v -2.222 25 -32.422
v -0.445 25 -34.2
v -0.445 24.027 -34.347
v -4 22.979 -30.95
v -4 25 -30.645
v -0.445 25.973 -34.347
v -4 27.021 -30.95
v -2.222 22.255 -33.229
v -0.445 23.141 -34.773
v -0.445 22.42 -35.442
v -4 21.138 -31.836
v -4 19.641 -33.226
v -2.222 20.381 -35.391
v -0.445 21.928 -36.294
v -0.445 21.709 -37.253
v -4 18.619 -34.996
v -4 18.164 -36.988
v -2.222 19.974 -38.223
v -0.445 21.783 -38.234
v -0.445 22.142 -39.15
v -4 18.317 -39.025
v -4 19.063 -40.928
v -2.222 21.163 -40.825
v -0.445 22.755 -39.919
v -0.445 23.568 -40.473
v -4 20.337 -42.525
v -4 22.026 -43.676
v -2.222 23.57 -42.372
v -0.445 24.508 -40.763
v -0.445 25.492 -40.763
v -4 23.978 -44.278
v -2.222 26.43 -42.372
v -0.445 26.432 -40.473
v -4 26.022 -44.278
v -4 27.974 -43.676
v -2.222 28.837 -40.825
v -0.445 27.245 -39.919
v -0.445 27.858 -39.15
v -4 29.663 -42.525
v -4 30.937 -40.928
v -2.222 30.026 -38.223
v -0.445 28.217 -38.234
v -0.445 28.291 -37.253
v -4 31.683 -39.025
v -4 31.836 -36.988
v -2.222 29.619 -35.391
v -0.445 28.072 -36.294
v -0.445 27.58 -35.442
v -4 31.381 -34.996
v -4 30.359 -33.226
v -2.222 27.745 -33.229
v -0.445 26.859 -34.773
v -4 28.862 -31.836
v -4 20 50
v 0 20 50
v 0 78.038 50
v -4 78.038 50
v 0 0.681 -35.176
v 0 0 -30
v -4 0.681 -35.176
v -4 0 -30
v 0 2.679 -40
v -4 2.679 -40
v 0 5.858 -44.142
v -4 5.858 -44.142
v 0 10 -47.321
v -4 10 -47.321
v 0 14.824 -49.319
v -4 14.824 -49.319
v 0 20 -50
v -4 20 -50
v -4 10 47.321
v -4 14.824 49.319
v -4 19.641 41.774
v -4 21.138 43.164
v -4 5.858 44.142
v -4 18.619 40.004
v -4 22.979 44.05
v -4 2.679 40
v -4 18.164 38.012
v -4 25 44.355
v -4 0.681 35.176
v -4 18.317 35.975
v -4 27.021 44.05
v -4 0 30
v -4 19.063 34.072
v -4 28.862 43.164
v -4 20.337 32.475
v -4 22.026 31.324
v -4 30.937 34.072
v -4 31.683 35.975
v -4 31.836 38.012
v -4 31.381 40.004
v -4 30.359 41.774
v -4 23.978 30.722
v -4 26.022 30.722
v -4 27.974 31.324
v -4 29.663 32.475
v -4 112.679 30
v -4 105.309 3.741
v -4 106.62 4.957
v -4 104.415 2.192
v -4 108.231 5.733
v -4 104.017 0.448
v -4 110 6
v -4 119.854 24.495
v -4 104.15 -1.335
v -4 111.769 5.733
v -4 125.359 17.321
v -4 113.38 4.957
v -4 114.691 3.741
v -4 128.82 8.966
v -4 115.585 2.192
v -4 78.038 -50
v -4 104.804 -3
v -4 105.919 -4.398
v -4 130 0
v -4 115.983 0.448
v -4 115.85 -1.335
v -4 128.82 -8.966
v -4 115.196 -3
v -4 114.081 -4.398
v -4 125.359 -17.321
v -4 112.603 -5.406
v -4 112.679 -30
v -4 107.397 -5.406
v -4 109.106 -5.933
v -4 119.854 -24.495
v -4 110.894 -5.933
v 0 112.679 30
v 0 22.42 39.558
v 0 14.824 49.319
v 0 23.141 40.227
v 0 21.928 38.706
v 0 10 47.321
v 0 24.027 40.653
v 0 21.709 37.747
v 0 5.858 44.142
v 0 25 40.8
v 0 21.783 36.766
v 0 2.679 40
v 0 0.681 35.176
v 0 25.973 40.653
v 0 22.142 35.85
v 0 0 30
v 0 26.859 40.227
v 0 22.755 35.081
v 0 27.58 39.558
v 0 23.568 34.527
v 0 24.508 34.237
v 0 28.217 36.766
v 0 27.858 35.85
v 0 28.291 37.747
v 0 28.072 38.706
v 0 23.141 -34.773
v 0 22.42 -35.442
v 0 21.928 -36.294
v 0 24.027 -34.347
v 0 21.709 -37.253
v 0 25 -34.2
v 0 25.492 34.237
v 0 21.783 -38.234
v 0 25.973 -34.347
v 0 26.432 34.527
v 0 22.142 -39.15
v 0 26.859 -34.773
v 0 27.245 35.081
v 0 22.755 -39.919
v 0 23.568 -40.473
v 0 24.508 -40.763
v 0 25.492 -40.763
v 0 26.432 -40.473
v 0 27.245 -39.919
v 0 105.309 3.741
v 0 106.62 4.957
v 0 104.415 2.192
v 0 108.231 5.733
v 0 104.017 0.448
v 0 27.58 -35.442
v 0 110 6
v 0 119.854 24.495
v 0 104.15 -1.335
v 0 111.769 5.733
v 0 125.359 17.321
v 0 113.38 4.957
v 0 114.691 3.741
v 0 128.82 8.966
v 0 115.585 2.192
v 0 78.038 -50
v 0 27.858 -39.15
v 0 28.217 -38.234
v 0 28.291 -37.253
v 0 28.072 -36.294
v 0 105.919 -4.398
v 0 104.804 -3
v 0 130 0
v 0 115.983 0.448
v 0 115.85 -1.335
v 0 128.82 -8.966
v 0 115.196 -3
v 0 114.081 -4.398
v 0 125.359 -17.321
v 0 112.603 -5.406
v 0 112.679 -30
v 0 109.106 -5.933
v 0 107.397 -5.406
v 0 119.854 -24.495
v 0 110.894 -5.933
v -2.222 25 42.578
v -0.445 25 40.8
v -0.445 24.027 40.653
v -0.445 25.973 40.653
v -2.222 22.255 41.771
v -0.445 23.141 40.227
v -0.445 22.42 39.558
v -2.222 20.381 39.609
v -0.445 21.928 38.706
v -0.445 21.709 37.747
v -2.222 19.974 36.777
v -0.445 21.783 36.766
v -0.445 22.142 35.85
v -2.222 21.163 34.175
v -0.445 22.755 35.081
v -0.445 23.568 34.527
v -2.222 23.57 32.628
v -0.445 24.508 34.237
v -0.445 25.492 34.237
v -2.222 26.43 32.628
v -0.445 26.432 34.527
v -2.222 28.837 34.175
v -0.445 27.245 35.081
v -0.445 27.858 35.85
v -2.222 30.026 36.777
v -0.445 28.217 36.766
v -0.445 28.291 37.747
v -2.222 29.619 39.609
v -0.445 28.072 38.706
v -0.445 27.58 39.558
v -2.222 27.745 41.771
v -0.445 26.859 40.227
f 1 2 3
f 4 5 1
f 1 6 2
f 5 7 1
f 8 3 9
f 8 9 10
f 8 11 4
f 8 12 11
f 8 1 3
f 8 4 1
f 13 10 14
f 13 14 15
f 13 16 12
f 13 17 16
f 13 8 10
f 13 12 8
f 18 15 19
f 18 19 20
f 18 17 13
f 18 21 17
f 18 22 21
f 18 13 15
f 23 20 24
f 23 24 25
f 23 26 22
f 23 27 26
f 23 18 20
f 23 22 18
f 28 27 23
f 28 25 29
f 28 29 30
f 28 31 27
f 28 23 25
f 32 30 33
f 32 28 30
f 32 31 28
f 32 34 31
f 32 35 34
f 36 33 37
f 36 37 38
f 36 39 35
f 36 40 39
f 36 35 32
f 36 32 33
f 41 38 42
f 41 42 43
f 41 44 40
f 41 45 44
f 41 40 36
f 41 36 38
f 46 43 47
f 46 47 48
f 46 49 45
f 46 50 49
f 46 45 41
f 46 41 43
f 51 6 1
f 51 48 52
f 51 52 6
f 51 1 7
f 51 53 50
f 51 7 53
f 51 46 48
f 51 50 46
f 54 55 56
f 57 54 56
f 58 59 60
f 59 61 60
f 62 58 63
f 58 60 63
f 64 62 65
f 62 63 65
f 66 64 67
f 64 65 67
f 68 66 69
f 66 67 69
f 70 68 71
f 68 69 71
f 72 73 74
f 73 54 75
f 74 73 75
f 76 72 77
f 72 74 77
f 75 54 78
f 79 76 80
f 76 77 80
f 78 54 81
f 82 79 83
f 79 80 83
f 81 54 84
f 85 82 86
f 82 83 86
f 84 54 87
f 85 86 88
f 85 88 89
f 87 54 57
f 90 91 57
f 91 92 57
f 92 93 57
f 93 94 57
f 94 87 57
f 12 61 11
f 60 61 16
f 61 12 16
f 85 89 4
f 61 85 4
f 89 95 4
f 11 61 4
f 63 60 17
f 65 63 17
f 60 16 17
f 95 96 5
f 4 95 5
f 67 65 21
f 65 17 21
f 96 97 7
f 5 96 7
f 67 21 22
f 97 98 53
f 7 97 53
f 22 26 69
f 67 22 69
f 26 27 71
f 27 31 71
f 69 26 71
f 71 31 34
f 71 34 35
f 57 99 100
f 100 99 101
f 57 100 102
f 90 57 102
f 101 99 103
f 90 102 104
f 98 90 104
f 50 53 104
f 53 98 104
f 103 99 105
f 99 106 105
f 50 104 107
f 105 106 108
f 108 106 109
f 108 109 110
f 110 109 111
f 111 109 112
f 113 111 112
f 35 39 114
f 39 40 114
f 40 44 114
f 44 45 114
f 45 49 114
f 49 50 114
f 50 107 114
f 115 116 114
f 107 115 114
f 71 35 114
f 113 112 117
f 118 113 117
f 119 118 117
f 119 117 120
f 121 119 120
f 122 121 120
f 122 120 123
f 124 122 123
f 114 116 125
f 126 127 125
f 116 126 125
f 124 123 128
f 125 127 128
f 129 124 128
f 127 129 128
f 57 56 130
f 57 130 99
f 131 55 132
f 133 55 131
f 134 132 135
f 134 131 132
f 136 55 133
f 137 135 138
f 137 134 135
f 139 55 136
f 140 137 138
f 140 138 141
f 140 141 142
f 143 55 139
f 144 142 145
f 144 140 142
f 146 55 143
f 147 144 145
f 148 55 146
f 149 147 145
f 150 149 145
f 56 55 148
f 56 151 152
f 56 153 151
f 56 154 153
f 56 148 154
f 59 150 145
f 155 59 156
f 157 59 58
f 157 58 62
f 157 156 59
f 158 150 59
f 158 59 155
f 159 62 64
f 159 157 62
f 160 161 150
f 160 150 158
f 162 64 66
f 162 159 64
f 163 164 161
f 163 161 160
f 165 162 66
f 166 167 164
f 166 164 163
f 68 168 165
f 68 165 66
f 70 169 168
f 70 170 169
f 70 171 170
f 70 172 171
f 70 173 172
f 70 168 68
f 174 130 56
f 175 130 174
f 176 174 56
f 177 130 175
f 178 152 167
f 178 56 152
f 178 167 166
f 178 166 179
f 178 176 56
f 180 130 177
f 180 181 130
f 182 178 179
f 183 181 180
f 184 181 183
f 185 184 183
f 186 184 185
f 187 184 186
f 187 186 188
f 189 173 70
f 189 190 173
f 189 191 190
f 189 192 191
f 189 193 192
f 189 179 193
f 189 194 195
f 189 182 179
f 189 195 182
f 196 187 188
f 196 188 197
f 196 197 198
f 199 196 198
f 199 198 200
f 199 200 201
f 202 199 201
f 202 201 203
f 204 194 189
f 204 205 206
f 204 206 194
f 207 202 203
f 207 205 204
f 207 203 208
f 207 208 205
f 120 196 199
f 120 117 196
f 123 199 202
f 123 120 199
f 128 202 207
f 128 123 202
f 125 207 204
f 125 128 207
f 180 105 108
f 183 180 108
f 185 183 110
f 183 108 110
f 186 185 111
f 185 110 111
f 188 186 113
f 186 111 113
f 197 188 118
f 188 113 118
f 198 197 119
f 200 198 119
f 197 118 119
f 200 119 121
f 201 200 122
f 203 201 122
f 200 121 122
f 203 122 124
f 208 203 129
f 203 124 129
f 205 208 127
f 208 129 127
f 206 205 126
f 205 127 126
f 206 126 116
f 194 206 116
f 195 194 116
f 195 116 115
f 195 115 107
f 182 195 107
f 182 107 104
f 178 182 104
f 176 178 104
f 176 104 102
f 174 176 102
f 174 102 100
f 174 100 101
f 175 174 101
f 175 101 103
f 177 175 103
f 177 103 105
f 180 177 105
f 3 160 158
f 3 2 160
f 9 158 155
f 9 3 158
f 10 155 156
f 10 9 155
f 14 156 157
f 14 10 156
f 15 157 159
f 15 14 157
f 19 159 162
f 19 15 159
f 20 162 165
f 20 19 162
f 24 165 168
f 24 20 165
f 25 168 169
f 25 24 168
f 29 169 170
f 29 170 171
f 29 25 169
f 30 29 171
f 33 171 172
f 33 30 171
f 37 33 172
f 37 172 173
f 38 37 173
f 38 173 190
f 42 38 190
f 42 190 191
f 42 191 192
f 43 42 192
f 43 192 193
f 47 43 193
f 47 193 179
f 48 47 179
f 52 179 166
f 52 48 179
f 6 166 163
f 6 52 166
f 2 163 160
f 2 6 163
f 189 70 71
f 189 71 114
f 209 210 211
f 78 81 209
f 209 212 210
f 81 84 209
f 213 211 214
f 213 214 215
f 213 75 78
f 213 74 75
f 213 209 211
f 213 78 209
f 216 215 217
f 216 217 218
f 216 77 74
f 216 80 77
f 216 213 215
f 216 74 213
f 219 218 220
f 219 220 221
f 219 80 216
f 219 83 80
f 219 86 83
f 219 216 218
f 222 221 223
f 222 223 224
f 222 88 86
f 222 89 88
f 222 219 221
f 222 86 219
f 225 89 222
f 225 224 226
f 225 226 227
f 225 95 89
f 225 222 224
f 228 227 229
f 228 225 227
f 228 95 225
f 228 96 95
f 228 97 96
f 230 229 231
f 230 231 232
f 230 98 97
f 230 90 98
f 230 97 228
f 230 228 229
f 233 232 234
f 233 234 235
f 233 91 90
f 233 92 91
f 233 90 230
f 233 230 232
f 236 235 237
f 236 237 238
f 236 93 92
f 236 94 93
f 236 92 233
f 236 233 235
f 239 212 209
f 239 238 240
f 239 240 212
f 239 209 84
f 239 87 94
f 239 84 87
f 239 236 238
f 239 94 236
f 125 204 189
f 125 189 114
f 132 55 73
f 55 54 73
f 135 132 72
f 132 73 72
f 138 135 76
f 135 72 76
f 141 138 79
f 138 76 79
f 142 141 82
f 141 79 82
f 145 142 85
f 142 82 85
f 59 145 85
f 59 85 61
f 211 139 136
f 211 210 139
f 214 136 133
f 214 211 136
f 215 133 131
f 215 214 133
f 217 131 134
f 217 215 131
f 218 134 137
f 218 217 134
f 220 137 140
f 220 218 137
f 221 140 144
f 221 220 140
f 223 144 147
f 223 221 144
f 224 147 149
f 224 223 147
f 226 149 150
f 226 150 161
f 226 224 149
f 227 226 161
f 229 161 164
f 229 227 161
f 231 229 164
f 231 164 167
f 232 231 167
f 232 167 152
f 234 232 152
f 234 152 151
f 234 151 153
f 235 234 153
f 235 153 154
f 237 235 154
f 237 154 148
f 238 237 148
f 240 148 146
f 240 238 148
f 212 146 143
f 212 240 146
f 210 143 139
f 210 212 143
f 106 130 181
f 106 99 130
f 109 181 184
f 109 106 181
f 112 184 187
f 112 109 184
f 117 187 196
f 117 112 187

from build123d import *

# Parameters (mm, degrees)
SKETCH_10_W                = 100
SKETCH_10_H                = 130
SM_BASE_FLANGE_1_DEPTH     = 4
SKETCH_13_R                = 6
CUT_EXTRUDE_1_DEPTH        = 10
HOLE_WIZARD_M61_AT_2_COUNT = 2
HOLE_WIZARD_M61_AT_2_PITCH = 75
CHAMFER_1_SIZE             = 30
CHAMFER_1_SIZE2            = 51.961524227
FILLET_1_R                 = 34.641016
FILLET_2_R                 = 20


# Sheet-metal steps are written as plain solids
with BuildPart() as part:
    # Эскиз10 → Базовая кромка1 (new body)
    with BuildSketch(Plane(origin=(0, 0, 0), x_dir=(0, 0, -1), z_dir=(1, 0, 0))):
        with Locations((0, 65)):
            Rectangle(SKETCH_10_W, SKETCH_10_H)
    extrude(amount=-SM_BASE_FLANGE_1_DEPTH)

    # Эскиз13 → Вырез-Вытянуть1 (cut)
    with BuildSketch(Plane.ZY.offset(4)):
        with Locations((0, 110)):
            Circle(SKETCH_13_R)
    extrude(amount=-CUT_EXTRUDE_1_DEPTH, mode=Mode.SUBTRACT)

    # Эскиз16 → Зенковка для винта с потайной головкой и внутренним шестигранником M61 (revolve, cut)
    with BuildSketch(Plane(origin=(-4, 25, -37.5), x_dir=(0, 0, 1), z_dir=(0, 1, 0))):
        Polygon((0, 0), (0, 4), (3.3, 4), (3.3, 3.555), (6.855, 0), align=None)
    hole_wizard_m61 = revolve(axis=Axis((-10.35, 25, -37.5), (1, 0, 0)), mode=Mode.SUBTRACT)

    # Зенковка для винта с потайной головкой и внутренним шестигранником M61 at 2: Зенковка для винта с потайной головкой и внутренним шестигранником M61 ×2
    with Locations(*[(0, 0, i * HOLE_WIZARD_M61_AT_2_PITCH) for i in range(1, HOLE_WIZARD_M61_AT_2_COUNT)]):
        add(hole_wizard_m61, mode=Mode.SUBTRACT)

    # Фаска1
    chamfer_1_edges = [part.edges().sort_by_distance(p)[0] for p in [
        (-2, 130, 50),
        (-2, 130, -50),
    ]]
    chamfer_1_side = [part.faces().sort_by_distance(p)[0] for p in [
        (-2, 130, 0),
    ]]
    chamfer(chamfer_1_edges, length=CHAMFER_1_SIZE, length2=CHAMFER_1_SIZE2, reference=chamfer_1_side[0])

    # Скругление1
    fillet_1_edges = [part.edges().sort_by_distance(p)[0] for p in [
        (-2, 130, -20),
        (-2, 130, 20),
    ]]
    fillet(fillet_1_edges, radius=FILLET_1_R)

    # Скругление2
    fillet_2_edges = [part.edges().sort_by_distance(p)[0] for p in [
        (-2, 0, -50),
        (-2, 0, 50),
    ]]
    fillet(fillet_2_edges, radius=FILLET_2_R)


solid = part.part
